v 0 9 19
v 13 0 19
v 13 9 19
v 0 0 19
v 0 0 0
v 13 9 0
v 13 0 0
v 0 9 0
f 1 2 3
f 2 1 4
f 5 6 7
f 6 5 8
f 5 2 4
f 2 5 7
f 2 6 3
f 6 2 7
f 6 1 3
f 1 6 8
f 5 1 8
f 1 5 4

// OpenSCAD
// Generated by SolidPython 1.0.1 on 2020-07-29 00:46:55


cube(size = [13, 9, 19]);
/***********************************************
*********      SolidPython code:      **********
************************************************
 
# import packages: SolidPython
from solid import *
from solid.utils import *
from itertools import chain, combinations, permutations


class Resize:

    def __init__(self, scad_file):
        self.scad_file = scad_file
        #self.scad_file = import_scad(scad_file)
        # cone/cylinder param:
        self.r1 = 0
        self.r2 = 0
        self.h = 0
        # rectangular prism param:
        self.w = 0
        self.l = 0
        # ellipse param:
        self.r = 0

    # import OpenScad code (file name corresponds to shape)


    # classify shape + parameters
    def assign(self, param1, param2, param3):
        if self.scad_file == 'cone.scad':
            self.r1 = param1
            self.r2 = param2
            self.h = param3
        elif self.scad_file == 'cylinder.scad':
            self.r1 = param1
            self.r2 = param2
            self.h = param3
        elif self.scad_file == 'rectangularPrism.scad':
            self.h = param1
            self.l = param2
            self.w = param3
        else:
            self.r = param1
            self.h = param2

    # resize parameters
    def iterate(self):
        x = range(3, 20, 2)
        i = 1
        if self.scad_file == 'cone.scad':
            tempList = list(permutations(x, 2))
            for temp in tempList:
                param1 = temp[0]
                param2 = temp[1]
                filepath = 'produced_scad_files/' + 'cone' + str(param1) + '_' + str(param2) + '_' + '.scad'
                scad_render_to_file(cylinder(h=param1, r1=param2, r2=0), filepath)

        elif self.scad_file == 'cylinder.scad':
            tempList = list(permutations(x, 3))
            for temp in tempList:
                param1 = temp[0]
                param2 = temp[1]
                filepath = 'produced_scad_files/' + 'cylinder' + str(param1) + '_' + str(param2) + '_' + '.scad'
                scad_render_to_file(cylinder(h=param1, r1=param2, r2=param2), filepath)

        elif self.scad_file == 'rectangularPrism.scad':
            tempList = list(permutations(x, 3))
            for temp in tempList:
                param1 = temp[0]
                param2 = temp[1]
                param3 = temp[2]
                filepath = 'produced_scad_files/' + 'rectangularPrism' + str(param1) + '_' + str(param2) + '_' + str(
                    param3) + '.scad'
                scad_render_to_file(cube(size=(param1, param2, param3)), filepath)

        elif self.scad_file == 'ellipse.scad':
            tempList = list(permutations(x, 4))
            for temp in tempList:
                param1 = temp[0]
                param2 = temp[1]
                param3 = temp[2]
                param4 = temp[3]
                filepath = 'produced_scad_files/' + 'ellipse' + str(param1) + '_' + str(param2) + '_' + str(param3) + '_' + str(param4) + '.scad'
                scad_render_to_file(scale([param1, param2, param3])(sphere(r=param4)), filepath)

    def render_to_scadfile(self):
        scad_render_to_file(scad, 'example.scad') 
 
************************************************/
